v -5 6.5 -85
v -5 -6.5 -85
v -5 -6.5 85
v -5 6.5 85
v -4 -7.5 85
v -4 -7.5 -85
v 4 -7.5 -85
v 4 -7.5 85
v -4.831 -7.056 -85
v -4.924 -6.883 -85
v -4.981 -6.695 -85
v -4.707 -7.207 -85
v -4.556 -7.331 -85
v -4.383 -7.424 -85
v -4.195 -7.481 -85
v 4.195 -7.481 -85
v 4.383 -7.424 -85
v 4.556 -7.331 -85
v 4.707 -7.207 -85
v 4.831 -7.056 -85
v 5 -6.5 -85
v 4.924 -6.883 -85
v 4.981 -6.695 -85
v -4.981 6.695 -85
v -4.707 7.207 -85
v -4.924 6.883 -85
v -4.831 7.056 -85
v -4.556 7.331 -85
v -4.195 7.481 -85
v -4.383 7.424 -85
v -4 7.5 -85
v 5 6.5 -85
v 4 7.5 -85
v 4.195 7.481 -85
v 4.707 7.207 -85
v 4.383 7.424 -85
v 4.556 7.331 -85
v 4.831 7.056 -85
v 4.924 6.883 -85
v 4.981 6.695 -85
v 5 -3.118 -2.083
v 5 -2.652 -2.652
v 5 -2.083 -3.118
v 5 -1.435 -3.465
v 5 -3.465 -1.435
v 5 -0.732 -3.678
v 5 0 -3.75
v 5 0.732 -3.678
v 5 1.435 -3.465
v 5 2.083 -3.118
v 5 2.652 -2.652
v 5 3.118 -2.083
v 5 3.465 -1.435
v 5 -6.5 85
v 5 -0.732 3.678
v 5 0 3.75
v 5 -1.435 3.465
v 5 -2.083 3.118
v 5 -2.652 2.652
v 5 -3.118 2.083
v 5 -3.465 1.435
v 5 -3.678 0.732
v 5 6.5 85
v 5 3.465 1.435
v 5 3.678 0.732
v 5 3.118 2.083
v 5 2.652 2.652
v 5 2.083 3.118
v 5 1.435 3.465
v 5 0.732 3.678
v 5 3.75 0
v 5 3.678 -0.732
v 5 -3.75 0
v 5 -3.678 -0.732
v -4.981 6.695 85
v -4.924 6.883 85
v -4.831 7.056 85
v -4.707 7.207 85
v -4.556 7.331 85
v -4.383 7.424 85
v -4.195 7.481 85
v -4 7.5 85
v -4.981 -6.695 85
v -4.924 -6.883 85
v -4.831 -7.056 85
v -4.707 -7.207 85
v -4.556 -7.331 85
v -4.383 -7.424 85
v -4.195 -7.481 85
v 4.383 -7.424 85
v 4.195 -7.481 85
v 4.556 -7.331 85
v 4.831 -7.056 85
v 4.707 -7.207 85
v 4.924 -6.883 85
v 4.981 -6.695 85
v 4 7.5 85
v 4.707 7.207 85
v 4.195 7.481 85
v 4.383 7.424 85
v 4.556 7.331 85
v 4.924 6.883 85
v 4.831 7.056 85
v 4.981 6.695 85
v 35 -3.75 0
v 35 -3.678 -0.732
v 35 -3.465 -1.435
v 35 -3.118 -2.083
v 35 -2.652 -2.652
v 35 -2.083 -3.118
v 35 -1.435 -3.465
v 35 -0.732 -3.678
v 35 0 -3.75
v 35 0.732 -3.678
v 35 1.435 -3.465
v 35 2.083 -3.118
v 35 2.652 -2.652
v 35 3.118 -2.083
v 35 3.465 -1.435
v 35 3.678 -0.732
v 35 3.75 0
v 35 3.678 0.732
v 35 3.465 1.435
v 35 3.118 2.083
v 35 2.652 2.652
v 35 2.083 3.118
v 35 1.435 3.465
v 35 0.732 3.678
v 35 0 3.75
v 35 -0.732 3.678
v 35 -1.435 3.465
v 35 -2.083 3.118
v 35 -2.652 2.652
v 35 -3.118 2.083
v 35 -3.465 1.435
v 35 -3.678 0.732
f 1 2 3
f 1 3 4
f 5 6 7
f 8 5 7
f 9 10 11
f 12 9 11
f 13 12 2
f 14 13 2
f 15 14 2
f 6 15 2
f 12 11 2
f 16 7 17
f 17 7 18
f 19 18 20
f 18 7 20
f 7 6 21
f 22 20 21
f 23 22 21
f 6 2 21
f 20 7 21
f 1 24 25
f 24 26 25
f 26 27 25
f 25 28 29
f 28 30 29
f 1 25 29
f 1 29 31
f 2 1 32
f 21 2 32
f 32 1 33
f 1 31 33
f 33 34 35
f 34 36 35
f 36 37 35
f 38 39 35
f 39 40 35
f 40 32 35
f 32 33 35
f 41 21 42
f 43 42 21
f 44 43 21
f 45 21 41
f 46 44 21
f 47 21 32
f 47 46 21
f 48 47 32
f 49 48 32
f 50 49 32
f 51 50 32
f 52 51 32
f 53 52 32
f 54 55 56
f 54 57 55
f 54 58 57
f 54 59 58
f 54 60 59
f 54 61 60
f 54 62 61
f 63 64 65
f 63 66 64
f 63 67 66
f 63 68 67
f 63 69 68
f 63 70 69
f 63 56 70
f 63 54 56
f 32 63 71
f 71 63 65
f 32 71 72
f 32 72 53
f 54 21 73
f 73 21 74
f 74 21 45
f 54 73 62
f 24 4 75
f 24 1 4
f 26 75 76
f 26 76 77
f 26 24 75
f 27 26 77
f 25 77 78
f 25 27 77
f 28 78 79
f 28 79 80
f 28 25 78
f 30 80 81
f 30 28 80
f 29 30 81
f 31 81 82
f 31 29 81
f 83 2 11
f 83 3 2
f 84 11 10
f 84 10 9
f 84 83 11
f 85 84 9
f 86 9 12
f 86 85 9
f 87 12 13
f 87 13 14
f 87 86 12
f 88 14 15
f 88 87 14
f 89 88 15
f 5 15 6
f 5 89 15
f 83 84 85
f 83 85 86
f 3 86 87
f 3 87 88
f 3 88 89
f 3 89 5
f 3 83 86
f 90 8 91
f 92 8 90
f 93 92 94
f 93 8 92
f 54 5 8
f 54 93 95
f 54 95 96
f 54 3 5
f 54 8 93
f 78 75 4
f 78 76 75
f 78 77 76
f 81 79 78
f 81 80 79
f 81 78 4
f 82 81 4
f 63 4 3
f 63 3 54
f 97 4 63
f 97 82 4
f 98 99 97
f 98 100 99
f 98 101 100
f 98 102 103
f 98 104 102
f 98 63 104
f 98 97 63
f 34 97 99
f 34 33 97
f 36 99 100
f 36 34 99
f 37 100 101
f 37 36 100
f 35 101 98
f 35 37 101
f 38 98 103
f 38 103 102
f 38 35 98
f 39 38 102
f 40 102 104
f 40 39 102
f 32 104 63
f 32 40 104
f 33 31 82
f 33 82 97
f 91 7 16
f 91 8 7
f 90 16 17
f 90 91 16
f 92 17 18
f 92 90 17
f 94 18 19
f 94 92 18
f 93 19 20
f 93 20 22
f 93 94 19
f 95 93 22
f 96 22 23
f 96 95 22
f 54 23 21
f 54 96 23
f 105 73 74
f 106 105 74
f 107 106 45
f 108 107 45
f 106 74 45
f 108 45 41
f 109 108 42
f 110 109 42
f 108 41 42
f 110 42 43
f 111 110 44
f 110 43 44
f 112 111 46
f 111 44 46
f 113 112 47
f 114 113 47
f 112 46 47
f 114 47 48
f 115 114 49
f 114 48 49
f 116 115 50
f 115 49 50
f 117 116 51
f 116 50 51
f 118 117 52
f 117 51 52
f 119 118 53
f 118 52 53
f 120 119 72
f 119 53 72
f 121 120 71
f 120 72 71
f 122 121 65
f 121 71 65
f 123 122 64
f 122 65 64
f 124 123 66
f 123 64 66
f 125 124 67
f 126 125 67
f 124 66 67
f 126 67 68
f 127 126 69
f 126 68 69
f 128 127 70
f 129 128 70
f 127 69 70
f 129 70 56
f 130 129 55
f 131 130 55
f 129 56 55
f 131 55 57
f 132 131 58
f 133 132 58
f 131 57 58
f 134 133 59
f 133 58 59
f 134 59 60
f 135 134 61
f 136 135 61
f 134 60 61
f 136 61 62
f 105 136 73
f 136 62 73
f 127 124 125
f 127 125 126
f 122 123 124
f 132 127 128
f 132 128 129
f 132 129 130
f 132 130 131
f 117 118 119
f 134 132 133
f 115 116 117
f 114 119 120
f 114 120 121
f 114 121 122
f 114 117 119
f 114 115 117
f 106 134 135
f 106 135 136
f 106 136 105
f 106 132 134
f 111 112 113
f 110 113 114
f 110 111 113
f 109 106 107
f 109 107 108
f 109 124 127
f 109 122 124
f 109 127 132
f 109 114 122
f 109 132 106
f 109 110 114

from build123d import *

# Parameters (mm, degrees)
SKETCH1_W           = 10
SKETCH1_H           = 15
BOSS_EXTRUDE1_DEPTH = 85
SKETCH2_R           = 3.75
BOSS_EXTRUDE2_DEPTH = 30
FILLET2_R           = 1


with BuildPart() as part:
    # Sketch1 → Boss-Extrude1 (new, symmetric)
    with BuildSketch(Plane.XY):
        Rectangle(SKETCH1_W, SKETCH1_H)
    extrude(amount=BOSS_EXTRUDE1_DEPTH, both=True)

    # Sketch2 → Boss-Extrude2 (add)
    with BuildSketch(Plane(origin=(5, 0, 0), x_dir=(0, 0, -1), z_dir=(1, 0, 0))):
        with Locations(Location((0, 0, 0), (0, 0, 270))):
            Circle(SKETCH2_R)
    extrude(amount=BOSS_EXTRUDE2_DEPTH)

    # Fillet2
    fillet2_edges = [part.edges().sort_by_distance(p)[0] for p in [
        (-5, 7.5, 0),
        (5, 7.5, 0),
        (5, -7.5, 0),
        (-5, -7.5, 0),
    ]]
    fillet(fillet2_edges, radius=FILLET2_R)


solid = part.part
